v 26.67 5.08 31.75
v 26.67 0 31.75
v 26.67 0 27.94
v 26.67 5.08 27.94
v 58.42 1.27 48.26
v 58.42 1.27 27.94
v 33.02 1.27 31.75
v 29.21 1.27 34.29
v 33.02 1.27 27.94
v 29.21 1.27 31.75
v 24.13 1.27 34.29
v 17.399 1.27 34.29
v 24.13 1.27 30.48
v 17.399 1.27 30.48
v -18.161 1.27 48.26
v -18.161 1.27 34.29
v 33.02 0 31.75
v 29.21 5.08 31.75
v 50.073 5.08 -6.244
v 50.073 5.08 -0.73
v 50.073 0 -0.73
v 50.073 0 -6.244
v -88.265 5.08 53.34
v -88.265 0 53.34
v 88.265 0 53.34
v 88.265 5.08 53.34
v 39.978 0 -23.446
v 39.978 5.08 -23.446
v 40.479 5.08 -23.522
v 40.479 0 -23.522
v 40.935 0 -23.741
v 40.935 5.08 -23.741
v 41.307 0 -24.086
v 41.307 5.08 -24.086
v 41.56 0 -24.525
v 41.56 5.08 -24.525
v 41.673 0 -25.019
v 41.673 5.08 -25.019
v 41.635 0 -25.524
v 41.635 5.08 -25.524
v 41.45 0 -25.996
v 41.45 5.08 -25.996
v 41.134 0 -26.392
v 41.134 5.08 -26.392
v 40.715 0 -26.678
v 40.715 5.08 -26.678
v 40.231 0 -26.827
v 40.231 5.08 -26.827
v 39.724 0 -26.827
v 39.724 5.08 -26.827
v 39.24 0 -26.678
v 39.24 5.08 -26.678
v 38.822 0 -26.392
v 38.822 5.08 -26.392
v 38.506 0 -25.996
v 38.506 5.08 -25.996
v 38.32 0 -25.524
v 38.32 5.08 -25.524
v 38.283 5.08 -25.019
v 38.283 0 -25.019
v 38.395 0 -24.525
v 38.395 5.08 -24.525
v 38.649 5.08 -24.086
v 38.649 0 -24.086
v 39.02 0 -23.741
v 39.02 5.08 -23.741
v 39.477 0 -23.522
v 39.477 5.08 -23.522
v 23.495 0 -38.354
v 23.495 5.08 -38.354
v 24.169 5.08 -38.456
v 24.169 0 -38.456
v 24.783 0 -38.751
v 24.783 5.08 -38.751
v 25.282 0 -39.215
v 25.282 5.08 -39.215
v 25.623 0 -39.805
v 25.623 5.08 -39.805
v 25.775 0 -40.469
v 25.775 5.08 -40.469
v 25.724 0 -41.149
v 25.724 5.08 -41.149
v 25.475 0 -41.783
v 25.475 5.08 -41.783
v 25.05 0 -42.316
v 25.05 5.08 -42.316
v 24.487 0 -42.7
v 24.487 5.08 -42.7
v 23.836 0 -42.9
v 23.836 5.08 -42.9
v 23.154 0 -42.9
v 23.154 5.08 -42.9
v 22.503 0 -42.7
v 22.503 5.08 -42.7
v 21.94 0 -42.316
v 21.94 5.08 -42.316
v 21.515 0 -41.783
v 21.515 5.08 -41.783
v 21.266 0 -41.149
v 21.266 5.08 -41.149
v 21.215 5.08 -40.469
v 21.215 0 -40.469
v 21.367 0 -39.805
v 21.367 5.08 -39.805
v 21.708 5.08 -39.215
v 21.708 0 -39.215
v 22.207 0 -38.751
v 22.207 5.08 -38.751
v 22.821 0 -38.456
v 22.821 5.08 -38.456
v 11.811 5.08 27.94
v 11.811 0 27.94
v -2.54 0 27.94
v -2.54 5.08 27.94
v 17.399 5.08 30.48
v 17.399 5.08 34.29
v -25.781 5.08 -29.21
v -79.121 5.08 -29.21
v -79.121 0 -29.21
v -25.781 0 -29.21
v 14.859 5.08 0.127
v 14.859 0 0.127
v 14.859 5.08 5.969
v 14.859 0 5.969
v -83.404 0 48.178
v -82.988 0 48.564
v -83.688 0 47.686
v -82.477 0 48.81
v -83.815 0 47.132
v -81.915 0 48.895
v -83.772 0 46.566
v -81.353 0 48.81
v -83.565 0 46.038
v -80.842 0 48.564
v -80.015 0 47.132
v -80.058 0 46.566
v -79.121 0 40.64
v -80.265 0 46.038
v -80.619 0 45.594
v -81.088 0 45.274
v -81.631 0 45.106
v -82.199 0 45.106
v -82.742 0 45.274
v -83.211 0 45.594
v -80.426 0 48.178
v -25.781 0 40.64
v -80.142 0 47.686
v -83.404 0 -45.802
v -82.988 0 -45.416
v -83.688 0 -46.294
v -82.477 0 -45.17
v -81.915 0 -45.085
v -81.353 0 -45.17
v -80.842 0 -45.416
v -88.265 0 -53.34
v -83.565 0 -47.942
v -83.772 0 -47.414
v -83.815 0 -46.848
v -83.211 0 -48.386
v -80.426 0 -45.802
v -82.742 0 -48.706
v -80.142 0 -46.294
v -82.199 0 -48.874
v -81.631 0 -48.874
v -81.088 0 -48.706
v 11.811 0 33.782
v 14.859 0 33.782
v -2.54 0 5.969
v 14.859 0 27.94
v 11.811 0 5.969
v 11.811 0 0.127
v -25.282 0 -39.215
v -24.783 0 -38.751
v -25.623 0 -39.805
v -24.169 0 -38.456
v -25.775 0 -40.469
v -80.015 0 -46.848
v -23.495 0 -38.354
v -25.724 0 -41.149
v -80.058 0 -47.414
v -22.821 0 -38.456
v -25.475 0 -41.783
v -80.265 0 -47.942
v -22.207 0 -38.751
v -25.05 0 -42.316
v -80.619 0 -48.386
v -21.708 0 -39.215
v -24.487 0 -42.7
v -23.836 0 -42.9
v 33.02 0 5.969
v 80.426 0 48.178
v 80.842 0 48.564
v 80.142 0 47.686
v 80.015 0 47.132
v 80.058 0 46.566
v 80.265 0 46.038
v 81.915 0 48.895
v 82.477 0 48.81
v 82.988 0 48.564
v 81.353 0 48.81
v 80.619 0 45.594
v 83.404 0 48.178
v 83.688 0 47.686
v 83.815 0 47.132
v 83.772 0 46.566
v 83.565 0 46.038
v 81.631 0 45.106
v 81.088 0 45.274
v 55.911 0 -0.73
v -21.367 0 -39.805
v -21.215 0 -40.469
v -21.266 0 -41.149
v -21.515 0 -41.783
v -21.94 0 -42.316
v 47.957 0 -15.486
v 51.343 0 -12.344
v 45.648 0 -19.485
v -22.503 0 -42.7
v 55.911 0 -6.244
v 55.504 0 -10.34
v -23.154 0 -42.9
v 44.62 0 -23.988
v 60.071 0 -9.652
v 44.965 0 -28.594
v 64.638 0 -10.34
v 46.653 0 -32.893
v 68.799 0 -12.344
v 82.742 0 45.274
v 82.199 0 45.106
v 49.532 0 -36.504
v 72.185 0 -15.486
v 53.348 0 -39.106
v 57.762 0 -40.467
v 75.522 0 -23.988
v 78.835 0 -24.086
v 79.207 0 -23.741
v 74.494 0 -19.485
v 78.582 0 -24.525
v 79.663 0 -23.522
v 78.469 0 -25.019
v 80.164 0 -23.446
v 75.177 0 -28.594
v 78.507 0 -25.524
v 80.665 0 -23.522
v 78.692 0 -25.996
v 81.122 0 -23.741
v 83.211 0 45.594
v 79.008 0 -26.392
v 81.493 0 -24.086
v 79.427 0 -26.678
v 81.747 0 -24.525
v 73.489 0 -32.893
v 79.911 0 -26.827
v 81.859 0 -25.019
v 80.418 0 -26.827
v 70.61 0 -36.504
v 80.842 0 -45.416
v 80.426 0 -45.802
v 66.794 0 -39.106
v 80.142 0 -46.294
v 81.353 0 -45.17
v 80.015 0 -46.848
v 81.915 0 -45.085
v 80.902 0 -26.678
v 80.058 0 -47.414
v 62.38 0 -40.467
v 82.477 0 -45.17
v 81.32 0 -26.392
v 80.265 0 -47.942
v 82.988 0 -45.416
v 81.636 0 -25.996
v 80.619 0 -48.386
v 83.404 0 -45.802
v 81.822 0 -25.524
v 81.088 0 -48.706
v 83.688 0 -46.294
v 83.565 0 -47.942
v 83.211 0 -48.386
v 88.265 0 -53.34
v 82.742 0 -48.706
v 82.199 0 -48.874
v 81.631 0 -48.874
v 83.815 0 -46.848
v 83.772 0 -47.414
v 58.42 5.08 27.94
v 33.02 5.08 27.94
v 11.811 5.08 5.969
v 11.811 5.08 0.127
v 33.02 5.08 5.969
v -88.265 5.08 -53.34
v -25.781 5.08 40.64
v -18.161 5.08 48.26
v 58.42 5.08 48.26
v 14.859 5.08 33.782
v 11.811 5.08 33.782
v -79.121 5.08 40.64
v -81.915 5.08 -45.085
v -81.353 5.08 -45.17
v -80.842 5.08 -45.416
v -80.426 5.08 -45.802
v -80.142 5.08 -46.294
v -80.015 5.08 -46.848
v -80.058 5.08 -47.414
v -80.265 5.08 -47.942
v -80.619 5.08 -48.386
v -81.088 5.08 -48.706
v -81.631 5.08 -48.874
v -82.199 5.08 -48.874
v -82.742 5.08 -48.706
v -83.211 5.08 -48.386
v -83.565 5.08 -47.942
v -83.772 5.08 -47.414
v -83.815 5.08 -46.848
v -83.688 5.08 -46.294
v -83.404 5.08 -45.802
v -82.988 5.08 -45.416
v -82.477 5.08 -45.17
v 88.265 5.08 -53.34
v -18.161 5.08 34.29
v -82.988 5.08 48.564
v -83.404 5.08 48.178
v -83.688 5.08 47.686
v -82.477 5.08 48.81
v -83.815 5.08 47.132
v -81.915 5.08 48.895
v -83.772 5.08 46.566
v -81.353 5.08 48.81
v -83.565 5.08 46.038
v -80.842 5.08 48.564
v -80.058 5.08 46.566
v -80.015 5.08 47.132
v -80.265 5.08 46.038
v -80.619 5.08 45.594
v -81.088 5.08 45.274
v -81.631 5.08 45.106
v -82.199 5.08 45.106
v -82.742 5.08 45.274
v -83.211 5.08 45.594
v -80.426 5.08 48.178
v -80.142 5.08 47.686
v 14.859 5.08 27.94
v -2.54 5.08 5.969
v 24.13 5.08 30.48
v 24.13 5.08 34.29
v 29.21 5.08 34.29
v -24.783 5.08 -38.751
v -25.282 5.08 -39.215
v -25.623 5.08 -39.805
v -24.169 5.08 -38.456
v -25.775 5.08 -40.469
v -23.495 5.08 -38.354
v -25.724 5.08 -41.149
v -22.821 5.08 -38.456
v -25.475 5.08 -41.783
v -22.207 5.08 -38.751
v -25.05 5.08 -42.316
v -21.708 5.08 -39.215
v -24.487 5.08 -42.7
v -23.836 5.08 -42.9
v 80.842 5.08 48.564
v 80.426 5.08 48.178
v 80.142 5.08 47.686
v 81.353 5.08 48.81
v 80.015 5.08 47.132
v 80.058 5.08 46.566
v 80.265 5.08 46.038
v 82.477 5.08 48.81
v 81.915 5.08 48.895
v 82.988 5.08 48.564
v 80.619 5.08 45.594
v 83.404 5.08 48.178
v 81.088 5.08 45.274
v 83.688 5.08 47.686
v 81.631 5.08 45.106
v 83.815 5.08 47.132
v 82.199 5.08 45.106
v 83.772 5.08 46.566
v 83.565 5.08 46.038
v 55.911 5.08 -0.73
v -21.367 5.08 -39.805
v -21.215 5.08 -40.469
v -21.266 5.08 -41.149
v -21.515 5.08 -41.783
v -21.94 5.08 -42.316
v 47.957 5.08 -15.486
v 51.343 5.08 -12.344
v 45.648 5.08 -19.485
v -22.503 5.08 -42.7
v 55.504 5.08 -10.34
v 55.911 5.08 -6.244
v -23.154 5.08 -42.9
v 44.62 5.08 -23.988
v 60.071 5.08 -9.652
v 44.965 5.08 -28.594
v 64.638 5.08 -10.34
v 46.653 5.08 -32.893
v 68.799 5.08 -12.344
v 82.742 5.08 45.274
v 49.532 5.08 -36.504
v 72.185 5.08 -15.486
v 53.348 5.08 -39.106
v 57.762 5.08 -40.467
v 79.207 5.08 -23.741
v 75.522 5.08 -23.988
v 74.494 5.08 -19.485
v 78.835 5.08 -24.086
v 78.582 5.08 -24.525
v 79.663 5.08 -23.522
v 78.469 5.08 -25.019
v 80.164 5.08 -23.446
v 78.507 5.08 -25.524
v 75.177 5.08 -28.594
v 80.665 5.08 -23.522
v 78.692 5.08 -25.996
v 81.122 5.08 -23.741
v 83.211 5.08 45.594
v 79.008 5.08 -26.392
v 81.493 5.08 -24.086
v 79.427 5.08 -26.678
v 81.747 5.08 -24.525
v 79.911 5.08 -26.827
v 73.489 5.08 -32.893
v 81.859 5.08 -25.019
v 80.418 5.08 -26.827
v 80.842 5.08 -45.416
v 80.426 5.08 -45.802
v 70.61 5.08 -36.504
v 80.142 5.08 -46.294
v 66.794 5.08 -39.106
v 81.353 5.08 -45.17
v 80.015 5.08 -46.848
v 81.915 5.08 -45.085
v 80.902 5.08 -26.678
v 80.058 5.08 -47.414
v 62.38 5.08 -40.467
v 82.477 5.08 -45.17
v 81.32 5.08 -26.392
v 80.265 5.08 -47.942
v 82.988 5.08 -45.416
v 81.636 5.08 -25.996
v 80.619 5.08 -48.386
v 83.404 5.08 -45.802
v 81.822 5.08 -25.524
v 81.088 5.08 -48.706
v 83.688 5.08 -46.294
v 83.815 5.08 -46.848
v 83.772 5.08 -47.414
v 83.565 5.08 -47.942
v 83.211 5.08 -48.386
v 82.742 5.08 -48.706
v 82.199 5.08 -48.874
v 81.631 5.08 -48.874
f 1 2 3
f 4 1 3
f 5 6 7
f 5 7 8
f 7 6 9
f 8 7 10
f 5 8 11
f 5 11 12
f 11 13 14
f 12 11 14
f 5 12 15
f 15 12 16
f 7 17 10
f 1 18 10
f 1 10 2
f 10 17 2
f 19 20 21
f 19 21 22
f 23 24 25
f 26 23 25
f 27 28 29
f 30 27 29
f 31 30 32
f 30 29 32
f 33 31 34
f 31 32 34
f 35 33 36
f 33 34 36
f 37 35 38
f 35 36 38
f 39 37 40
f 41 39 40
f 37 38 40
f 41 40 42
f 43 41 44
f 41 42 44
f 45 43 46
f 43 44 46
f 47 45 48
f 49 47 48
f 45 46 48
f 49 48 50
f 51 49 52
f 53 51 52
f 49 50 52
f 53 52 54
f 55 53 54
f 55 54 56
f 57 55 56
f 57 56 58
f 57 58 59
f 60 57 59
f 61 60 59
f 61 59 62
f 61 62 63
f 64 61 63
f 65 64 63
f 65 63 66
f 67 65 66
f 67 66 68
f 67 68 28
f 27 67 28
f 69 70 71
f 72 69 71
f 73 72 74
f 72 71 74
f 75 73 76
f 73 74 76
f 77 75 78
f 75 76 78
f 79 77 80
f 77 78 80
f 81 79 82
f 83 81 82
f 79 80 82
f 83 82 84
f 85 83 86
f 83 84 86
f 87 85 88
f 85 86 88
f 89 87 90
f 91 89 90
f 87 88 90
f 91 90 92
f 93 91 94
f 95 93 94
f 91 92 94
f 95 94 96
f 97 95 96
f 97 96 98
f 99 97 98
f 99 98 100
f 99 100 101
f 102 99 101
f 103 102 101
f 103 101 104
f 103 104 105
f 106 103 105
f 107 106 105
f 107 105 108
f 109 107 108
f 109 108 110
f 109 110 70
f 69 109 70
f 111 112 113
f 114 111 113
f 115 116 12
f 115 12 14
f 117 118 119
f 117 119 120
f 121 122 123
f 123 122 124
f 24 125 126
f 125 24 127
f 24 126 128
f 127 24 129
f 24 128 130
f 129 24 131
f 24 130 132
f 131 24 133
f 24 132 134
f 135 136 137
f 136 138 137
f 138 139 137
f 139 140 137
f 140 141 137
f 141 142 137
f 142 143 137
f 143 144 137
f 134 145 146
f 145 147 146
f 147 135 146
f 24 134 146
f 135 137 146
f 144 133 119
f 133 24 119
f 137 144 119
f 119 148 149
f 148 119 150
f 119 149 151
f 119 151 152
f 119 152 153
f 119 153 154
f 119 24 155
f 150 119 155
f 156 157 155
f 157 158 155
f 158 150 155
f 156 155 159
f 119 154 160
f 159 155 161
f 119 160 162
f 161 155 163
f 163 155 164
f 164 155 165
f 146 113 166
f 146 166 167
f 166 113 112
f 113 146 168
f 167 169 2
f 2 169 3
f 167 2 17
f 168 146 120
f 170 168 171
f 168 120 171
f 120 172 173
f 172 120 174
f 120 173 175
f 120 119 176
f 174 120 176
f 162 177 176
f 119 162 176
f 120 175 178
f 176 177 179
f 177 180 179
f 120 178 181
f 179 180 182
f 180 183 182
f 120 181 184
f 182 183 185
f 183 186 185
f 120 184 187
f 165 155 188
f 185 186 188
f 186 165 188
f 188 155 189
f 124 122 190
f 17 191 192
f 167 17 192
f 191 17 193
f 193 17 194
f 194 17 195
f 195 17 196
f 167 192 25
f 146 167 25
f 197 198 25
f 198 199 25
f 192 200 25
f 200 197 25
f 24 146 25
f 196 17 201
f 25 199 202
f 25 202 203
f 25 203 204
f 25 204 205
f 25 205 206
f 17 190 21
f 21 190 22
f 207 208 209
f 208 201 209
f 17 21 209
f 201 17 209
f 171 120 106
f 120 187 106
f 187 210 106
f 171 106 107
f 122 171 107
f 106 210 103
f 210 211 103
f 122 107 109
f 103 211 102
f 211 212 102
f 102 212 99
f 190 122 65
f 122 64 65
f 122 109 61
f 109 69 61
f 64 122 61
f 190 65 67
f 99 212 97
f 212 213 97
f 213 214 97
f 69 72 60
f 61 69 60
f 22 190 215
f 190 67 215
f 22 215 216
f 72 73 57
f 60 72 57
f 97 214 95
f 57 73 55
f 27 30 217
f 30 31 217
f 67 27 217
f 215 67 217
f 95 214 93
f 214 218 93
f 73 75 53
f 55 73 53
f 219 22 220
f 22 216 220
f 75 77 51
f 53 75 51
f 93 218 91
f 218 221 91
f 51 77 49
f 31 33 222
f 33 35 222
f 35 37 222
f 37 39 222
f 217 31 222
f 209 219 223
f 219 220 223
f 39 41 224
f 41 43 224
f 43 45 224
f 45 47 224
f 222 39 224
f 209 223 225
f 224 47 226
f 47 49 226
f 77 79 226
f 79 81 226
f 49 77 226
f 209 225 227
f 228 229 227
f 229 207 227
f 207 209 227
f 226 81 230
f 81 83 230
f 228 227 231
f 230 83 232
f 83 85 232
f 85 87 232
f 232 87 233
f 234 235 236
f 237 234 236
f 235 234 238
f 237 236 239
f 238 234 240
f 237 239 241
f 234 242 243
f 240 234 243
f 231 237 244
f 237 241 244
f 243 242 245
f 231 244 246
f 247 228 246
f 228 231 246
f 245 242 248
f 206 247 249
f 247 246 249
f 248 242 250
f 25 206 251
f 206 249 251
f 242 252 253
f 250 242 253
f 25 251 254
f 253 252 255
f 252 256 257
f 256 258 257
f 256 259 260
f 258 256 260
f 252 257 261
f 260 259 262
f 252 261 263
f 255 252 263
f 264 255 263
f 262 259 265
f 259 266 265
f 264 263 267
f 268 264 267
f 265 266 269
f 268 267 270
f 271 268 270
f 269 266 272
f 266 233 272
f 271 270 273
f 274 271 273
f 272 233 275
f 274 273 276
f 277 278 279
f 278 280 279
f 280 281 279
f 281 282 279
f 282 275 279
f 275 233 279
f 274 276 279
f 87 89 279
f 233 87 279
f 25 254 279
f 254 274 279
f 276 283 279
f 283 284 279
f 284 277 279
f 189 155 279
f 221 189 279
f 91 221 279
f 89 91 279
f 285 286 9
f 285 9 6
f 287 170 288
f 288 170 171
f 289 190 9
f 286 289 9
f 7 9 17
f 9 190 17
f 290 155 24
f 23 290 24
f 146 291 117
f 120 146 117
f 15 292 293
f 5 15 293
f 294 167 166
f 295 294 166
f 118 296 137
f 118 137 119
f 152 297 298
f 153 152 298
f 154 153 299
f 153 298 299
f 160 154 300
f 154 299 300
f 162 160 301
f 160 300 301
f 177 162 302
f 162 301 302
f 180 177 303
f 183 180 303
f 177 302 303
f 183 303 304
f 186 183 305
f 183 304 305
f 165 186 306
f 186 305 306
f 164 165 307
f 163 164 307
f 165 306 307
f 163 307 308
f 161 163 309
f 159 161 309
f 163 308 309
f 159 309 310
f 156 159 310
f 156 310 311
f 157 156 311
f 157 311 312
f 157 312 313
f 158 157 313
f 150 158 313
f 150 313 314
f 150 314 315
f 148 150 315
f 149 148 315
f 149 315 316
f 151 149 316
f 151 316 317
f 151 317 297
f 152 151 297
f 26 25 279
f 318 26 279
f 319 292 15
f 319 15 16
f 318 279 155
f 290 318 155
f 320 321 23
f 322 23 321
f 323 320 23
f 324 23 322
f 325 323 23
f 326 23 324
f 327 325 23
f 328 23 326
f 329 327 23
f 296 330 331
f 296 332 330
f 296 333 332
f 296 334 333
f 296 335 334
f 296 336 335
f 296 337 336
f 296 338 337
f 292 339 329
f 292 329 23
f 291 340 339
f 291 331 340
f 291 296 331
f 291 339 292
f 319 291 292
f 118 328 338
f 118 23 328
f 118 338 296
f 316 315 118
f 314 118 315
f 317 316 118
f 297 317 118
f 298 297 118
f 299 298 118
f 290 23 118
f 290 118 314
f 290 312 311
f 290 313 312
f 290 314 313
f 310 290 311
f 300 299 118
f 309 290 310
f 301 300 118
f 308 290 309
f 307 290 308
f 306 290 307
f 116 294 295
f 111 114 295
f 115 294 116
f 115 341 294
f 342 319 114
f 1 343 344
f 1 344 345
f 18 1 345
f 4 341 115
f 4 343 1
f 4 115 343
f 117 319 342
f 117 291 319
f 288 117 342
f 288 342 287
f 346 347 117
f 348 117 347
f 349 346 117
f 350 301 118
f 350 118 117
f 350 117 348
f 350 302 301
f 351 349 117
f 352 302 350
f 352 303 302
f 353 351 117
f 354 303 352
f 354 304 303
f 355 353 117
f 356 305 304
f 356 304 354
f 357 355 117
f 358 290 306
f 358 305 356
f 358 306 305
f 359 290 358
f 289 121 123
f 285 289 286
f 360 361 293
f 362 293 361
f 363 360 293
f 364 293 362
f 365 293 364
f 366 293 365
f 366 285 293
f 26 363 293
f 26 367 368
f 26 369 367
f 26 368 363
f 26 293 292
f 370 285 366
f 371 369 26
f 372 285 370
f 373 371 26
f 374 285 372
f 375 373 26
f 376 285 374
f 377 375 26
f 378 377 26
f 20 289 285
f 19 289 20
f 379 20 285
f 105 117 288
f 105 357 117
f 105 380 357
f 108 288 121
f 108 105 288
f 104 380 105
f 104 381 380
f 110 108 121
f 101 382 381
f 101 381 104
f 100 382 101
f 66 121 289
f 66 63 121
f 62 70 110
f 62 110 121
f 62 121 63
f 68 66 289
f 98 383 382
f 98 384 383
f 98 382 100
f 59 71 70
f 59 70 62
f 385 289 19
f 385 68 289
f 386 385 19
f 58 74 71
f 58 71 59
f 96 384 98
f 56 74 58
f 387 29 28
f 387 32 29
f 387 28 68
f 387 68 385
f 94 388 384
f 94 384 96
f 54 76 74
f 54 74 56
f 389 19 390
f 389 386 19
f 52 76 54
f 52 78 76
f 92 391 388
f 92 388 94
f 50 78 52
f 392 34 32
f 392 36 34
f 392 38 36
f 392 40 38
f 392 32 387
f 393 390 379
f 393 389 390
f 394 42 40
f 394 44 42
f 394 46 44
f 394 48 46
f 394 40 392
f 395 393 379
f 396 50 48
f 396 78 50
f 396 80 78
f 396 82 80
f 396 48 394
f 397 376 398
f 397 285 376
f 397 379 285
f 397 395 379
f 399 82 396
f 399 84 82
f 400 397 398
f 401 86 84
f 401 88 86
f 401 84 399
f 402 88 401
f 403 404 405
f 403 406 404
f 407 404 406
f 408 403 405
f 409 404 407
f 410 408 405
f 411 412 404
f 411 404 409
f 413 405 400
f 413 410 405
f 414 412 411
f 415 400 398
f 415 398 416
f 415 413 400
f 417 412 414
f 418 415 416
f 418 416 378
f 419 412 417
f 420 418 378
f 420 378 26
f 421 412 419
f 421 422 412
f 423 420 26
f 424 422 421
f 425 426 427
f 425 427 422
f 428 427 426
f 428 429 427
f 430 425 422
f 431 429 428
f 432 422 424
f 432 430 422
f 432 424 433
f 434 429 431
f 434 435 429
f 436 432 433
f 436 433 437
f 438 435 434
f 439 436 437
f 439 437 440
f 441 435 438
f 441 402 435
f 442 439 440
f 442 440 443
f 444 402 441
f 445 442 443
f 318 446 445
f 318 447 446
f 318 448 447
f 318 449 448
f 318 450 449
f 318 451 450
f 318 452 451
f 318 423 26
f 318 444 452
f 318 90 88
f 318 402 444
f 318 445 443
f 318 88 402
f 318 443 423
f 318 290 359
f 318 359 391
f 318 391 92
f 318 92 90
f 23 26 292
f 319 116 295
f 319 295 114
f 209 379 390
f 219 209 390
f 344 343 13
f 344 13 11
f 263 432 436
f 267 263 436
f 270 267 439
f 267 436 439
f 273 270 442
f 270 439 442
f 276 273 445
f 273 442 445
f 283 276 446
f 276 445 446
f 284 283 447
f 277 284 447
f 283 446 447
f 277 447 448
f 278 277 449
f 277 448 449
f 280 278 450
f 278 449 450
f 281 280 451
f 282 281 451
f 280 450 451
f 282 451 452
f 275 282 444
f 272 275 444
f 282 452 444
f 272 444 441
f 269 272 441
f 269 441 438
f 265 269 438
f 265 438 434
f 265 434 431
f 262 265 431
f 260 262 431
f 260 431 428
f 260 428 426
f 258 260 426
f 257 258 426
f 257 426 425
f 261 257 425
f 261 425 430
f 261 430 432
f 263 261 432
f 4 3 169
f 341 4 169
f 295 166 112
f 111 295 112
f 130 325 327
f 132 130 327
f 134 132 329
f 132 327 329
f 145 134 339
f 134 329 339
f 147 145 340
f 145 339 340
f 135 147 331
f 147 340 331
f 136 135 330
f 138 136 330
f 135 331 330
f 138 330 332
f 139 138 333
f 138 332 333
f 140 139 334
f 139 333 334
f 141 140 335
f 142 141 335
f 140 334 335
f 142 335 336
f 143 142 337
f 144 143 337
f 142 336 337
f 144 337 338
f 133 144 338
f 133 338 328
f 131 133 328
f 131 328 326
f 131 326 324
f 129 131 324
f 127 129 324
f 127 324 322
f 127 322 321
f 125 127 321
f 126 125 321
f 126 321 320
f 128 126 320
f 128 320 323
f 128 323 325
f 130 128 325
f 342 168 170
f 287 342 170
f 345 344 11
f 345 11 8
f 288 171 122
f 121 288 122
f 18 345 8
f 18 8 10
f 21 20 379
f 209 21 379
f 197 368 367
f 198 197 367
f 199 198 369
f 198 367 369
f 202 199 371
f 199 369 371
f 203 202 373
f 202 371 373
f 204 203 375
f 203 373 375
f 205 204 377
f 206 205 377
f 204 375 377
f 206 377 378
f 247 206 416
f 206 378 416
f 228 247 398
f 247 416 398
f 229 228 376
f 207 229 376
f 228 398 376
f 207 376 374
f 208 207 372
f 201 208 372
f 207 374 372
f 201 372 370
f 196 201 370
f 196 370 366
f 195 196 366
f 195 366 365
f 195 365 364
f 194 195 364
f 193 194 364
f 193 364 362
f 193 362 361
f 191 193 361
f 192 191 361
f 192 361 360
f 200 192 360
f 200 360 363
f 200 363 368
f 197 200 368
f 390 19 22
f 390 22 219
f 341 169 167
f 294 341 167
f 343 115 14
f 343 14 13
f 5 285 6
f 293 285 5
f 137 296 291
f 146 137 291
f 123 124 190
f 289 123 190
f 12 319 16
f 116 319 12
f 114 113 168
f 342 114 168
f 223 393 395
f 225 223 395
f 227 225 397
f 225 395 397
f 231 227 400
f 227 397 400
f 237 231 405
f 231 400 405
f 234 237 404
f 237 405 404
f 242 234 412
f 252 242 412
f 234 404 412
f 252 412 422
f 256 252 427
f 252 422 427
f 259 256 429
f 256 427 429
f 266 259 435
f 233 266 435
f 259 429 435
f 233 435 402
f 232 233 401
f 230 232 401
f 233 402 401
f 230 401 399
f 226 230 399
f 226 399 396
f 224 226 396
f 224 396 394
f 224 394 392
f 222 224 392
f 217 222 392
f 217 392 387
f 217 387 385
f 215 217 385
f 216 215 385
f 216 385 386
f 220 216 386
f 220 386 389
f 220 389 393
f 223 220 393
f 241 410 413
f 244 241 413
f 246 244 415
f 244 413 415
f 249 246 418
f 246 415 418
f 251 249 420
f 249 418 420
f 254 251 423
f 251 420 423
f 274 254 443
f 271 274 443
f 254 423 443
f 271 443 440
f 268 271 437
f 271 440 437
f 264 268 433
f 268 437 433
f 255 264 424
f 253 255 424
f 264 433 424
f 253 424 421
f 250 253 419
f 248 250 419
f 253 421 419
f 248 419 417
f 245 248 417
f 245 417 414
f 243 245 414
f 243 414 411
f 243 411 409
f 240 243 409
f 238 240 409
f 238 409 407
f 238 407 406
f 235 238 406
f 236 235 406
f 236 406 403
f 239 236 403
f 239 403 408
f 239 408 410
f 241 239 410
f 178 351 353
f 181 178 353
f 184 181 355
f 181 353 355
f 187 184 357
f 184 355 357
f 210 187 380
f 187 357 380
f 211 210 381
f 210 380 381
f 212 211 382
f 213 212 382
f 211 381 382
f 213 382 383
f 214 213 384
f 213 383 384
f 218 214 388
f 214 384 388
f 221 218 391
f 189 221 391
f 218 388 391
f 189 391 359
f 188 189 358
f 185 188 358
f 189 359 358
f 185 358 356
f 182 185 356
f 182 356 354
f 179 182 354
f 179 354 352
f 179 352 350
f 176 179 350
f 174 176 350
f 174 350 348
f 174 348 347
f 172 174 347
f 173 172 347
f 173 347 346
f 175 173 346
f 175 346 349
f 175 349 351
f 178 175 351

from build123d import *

# Parameters (mm, degrees)
BOSS_EXTRUDE1_DEPTH = 5.08
SKETCH3_R           = 1.905
CUT_EXTRUDE1_DEPTH  = 104.255373831
SKETCH4_R           = 1.905
SKETCH4_R_2         = 2.286
CUT_EXTRUDE2_DEPTH  = 104.255373831
CUT_EXTRUDE3_DEPTH  = 104.255373831
SKETCH6_R           = 15.494
SKETCH6_R_2         = 1.7
CUT_EXTRUDE4_DEPTH  = 104.255373831
SKETCH7_W           = 53.34
SKETCH7_H           = 69.85
CUT_EXTRUDE5_DEPTH  = 104.255373831
SKETCH8_W           = 5.838418679
SKETCH8_H           = 5.514062087
CUT_EXTRUDE6_DEPTH  = 104.255373831
CUT_EXTRUDE7_DEPTH  = 3.81


with BuildPart() as part:
    # Sketch1 → Boss-Extrude1 (new body)
    with BuildSketch(Plane(origin=(0, 0, 0), x_dir=(1, 0, 0), z_dir=(0, 1, 0))):
        Polygon((-15.621, -53.34), (15.621, -53.34), (88.265, -53.34), (88.265, 53.34), (-88.265, 53.34), (-88.265, -53.34), align=None)
    extrude(amount=BOSS_EXTRUDE1_DEPTH)

    # Sketch3 → Cut-Extrude1 (cut, through all)
    with BuildSketch(Plane(origin=(0, 5.08, 0), x_dir=(1, 0, 0), z_dir=(0, 1, 0))):
        with Locations(Location((-81.915, 46.99, 0), (0, 0, 270))):
            Circle(SKETCH3_R)
    extrude(amount=-CUT_EXTRUDE1_DEPTH, mode=Mode.SUBTRACT)

    # Sketch4 → Cut-Extrude2 (cut, through all)
    with BuildSketch(Plane(origin=(0, 5.08, 0), x_dir=(1, 0, 0), z_dir=(0, 1, 0))):
        with Locations(Location((81.915, 46.99, 0), (0, 0, 270))):
            Circle(SKETCH4_R)
        with Locations(Location((-81.915, -46.99, 0), (0, 0, 270))):
            Circle(SKETCH4_R)
        with Locations(Location((81.915, -46.99, 0), (0, 0, 270))):
            Circle(SKETCH4_R)
        with Locations(Location((23.495, 40.64, 0), (0, 0, 270))):
            Circle(SKETCH4_R_2)
        with Locations(Location((-23.495, 40.64, 0), (0, 0, 270))):
            Circle(SKETCH4_R_2)
    extrude(amount=-CUT_EXTRUDE2_DEPTH, mode=Mode.SUBTRACT)

    # Sketch5 → Cut-Extrude3 (cut, through all)
    with BuildSketch(Plane.XZ):
        Polygon((-2.54, 27.94), (-2.54, 5.969), (11.811, 5.969), (11.811, 0.127), (14.859, 0.127), (14.859, 5.969), (33.02, 5.969), (33.02, 29.21), (33.02, 31.75), (26.67, 31.75), (26.67, 27.94), (25.80916534, 27.94), (14.859, 27.94), (14.859, 33.782), (11.811, 33.782), (11.811, 27.94), align=None)
    extrude(amount=-CUT_EXTRUDE3_DEPTH, mode=Mode.SUBTRACT)

    # Sketch6 → Cut-Extrude4 (cut, through all)
    with BuildSketch(Plane(origin=(0, 5.08, 0), x_dir=(1, 0, 0), z_dir=(0, 1, 0))):
        with Locations(Location((60.071, 25.146, 0), (0, 0, 270))):
            Circle(SKETCH6_R)
        with Locations(Location((39.9778, 25.146, 0), (0, 0, 270))):
            Circle(SKETCH6_R_2)
        with Locations(Location((80.1642, 25.146, 0), (0, 0, 270))):
            Circle(SKETCH6_R_2)
    extrude(amount=-CUT_EXTRUDE4_DEPTH, mode=Mode.SUBTRACT)

    # Sketch7 → Cut-Extrude5 (cut, through all)
    with BuildSketch(Plane(origin=(0, 5.08, 0), x_dir=(1, 0, 0), z_dir=(0, 1, 0))):
        with Locations((-52.451, -5.715)):
            Rectangle(SKETCH7_W, SKETCH7_H)
    extrude(amount=-CUT_EXTRUDE5_DEPTH, mode=Mode.SUBTRACT)

    # Sketch8 → Cut-Extrude6 (cut, through all)
    with BuildSketch(Plane(origin=(0, 5.08, 0), x_dir=(1, 0, 0), z_dir=(0, 1, 0))):
        with Locations((52.991758435, 3.486833379)):
            Rectangle(SKETCH8_W, SKETCH8_H)
    extrude(amount=-CUT_EXTRUDE6_DEPTH, mode=Mode.SUBTRACT)

    # Sketch9 → Cut-Extrude7 (cut)
    with BuildSketch(Plane(origin=(0, 5.08, 0), x_dir=(1, 0, 0), z_dir=(0, 1, 0))):
        Polygon((29.21, -27.94), (58.42, -27.94), (58.42, -48.26), (32.552533169, -48.26), (-18.161, -48.26), (-18.161, -34.29), (17.399, -34.29), (17.399, -30.48), (24.13, -30.48), (24.13, -34.29), (29.21, -34.29), align=None)
    extrude(amount=-CUT_EXTRUDE7_DEPTH, mode=Mode.SUBTRACT)


solid = part.part
